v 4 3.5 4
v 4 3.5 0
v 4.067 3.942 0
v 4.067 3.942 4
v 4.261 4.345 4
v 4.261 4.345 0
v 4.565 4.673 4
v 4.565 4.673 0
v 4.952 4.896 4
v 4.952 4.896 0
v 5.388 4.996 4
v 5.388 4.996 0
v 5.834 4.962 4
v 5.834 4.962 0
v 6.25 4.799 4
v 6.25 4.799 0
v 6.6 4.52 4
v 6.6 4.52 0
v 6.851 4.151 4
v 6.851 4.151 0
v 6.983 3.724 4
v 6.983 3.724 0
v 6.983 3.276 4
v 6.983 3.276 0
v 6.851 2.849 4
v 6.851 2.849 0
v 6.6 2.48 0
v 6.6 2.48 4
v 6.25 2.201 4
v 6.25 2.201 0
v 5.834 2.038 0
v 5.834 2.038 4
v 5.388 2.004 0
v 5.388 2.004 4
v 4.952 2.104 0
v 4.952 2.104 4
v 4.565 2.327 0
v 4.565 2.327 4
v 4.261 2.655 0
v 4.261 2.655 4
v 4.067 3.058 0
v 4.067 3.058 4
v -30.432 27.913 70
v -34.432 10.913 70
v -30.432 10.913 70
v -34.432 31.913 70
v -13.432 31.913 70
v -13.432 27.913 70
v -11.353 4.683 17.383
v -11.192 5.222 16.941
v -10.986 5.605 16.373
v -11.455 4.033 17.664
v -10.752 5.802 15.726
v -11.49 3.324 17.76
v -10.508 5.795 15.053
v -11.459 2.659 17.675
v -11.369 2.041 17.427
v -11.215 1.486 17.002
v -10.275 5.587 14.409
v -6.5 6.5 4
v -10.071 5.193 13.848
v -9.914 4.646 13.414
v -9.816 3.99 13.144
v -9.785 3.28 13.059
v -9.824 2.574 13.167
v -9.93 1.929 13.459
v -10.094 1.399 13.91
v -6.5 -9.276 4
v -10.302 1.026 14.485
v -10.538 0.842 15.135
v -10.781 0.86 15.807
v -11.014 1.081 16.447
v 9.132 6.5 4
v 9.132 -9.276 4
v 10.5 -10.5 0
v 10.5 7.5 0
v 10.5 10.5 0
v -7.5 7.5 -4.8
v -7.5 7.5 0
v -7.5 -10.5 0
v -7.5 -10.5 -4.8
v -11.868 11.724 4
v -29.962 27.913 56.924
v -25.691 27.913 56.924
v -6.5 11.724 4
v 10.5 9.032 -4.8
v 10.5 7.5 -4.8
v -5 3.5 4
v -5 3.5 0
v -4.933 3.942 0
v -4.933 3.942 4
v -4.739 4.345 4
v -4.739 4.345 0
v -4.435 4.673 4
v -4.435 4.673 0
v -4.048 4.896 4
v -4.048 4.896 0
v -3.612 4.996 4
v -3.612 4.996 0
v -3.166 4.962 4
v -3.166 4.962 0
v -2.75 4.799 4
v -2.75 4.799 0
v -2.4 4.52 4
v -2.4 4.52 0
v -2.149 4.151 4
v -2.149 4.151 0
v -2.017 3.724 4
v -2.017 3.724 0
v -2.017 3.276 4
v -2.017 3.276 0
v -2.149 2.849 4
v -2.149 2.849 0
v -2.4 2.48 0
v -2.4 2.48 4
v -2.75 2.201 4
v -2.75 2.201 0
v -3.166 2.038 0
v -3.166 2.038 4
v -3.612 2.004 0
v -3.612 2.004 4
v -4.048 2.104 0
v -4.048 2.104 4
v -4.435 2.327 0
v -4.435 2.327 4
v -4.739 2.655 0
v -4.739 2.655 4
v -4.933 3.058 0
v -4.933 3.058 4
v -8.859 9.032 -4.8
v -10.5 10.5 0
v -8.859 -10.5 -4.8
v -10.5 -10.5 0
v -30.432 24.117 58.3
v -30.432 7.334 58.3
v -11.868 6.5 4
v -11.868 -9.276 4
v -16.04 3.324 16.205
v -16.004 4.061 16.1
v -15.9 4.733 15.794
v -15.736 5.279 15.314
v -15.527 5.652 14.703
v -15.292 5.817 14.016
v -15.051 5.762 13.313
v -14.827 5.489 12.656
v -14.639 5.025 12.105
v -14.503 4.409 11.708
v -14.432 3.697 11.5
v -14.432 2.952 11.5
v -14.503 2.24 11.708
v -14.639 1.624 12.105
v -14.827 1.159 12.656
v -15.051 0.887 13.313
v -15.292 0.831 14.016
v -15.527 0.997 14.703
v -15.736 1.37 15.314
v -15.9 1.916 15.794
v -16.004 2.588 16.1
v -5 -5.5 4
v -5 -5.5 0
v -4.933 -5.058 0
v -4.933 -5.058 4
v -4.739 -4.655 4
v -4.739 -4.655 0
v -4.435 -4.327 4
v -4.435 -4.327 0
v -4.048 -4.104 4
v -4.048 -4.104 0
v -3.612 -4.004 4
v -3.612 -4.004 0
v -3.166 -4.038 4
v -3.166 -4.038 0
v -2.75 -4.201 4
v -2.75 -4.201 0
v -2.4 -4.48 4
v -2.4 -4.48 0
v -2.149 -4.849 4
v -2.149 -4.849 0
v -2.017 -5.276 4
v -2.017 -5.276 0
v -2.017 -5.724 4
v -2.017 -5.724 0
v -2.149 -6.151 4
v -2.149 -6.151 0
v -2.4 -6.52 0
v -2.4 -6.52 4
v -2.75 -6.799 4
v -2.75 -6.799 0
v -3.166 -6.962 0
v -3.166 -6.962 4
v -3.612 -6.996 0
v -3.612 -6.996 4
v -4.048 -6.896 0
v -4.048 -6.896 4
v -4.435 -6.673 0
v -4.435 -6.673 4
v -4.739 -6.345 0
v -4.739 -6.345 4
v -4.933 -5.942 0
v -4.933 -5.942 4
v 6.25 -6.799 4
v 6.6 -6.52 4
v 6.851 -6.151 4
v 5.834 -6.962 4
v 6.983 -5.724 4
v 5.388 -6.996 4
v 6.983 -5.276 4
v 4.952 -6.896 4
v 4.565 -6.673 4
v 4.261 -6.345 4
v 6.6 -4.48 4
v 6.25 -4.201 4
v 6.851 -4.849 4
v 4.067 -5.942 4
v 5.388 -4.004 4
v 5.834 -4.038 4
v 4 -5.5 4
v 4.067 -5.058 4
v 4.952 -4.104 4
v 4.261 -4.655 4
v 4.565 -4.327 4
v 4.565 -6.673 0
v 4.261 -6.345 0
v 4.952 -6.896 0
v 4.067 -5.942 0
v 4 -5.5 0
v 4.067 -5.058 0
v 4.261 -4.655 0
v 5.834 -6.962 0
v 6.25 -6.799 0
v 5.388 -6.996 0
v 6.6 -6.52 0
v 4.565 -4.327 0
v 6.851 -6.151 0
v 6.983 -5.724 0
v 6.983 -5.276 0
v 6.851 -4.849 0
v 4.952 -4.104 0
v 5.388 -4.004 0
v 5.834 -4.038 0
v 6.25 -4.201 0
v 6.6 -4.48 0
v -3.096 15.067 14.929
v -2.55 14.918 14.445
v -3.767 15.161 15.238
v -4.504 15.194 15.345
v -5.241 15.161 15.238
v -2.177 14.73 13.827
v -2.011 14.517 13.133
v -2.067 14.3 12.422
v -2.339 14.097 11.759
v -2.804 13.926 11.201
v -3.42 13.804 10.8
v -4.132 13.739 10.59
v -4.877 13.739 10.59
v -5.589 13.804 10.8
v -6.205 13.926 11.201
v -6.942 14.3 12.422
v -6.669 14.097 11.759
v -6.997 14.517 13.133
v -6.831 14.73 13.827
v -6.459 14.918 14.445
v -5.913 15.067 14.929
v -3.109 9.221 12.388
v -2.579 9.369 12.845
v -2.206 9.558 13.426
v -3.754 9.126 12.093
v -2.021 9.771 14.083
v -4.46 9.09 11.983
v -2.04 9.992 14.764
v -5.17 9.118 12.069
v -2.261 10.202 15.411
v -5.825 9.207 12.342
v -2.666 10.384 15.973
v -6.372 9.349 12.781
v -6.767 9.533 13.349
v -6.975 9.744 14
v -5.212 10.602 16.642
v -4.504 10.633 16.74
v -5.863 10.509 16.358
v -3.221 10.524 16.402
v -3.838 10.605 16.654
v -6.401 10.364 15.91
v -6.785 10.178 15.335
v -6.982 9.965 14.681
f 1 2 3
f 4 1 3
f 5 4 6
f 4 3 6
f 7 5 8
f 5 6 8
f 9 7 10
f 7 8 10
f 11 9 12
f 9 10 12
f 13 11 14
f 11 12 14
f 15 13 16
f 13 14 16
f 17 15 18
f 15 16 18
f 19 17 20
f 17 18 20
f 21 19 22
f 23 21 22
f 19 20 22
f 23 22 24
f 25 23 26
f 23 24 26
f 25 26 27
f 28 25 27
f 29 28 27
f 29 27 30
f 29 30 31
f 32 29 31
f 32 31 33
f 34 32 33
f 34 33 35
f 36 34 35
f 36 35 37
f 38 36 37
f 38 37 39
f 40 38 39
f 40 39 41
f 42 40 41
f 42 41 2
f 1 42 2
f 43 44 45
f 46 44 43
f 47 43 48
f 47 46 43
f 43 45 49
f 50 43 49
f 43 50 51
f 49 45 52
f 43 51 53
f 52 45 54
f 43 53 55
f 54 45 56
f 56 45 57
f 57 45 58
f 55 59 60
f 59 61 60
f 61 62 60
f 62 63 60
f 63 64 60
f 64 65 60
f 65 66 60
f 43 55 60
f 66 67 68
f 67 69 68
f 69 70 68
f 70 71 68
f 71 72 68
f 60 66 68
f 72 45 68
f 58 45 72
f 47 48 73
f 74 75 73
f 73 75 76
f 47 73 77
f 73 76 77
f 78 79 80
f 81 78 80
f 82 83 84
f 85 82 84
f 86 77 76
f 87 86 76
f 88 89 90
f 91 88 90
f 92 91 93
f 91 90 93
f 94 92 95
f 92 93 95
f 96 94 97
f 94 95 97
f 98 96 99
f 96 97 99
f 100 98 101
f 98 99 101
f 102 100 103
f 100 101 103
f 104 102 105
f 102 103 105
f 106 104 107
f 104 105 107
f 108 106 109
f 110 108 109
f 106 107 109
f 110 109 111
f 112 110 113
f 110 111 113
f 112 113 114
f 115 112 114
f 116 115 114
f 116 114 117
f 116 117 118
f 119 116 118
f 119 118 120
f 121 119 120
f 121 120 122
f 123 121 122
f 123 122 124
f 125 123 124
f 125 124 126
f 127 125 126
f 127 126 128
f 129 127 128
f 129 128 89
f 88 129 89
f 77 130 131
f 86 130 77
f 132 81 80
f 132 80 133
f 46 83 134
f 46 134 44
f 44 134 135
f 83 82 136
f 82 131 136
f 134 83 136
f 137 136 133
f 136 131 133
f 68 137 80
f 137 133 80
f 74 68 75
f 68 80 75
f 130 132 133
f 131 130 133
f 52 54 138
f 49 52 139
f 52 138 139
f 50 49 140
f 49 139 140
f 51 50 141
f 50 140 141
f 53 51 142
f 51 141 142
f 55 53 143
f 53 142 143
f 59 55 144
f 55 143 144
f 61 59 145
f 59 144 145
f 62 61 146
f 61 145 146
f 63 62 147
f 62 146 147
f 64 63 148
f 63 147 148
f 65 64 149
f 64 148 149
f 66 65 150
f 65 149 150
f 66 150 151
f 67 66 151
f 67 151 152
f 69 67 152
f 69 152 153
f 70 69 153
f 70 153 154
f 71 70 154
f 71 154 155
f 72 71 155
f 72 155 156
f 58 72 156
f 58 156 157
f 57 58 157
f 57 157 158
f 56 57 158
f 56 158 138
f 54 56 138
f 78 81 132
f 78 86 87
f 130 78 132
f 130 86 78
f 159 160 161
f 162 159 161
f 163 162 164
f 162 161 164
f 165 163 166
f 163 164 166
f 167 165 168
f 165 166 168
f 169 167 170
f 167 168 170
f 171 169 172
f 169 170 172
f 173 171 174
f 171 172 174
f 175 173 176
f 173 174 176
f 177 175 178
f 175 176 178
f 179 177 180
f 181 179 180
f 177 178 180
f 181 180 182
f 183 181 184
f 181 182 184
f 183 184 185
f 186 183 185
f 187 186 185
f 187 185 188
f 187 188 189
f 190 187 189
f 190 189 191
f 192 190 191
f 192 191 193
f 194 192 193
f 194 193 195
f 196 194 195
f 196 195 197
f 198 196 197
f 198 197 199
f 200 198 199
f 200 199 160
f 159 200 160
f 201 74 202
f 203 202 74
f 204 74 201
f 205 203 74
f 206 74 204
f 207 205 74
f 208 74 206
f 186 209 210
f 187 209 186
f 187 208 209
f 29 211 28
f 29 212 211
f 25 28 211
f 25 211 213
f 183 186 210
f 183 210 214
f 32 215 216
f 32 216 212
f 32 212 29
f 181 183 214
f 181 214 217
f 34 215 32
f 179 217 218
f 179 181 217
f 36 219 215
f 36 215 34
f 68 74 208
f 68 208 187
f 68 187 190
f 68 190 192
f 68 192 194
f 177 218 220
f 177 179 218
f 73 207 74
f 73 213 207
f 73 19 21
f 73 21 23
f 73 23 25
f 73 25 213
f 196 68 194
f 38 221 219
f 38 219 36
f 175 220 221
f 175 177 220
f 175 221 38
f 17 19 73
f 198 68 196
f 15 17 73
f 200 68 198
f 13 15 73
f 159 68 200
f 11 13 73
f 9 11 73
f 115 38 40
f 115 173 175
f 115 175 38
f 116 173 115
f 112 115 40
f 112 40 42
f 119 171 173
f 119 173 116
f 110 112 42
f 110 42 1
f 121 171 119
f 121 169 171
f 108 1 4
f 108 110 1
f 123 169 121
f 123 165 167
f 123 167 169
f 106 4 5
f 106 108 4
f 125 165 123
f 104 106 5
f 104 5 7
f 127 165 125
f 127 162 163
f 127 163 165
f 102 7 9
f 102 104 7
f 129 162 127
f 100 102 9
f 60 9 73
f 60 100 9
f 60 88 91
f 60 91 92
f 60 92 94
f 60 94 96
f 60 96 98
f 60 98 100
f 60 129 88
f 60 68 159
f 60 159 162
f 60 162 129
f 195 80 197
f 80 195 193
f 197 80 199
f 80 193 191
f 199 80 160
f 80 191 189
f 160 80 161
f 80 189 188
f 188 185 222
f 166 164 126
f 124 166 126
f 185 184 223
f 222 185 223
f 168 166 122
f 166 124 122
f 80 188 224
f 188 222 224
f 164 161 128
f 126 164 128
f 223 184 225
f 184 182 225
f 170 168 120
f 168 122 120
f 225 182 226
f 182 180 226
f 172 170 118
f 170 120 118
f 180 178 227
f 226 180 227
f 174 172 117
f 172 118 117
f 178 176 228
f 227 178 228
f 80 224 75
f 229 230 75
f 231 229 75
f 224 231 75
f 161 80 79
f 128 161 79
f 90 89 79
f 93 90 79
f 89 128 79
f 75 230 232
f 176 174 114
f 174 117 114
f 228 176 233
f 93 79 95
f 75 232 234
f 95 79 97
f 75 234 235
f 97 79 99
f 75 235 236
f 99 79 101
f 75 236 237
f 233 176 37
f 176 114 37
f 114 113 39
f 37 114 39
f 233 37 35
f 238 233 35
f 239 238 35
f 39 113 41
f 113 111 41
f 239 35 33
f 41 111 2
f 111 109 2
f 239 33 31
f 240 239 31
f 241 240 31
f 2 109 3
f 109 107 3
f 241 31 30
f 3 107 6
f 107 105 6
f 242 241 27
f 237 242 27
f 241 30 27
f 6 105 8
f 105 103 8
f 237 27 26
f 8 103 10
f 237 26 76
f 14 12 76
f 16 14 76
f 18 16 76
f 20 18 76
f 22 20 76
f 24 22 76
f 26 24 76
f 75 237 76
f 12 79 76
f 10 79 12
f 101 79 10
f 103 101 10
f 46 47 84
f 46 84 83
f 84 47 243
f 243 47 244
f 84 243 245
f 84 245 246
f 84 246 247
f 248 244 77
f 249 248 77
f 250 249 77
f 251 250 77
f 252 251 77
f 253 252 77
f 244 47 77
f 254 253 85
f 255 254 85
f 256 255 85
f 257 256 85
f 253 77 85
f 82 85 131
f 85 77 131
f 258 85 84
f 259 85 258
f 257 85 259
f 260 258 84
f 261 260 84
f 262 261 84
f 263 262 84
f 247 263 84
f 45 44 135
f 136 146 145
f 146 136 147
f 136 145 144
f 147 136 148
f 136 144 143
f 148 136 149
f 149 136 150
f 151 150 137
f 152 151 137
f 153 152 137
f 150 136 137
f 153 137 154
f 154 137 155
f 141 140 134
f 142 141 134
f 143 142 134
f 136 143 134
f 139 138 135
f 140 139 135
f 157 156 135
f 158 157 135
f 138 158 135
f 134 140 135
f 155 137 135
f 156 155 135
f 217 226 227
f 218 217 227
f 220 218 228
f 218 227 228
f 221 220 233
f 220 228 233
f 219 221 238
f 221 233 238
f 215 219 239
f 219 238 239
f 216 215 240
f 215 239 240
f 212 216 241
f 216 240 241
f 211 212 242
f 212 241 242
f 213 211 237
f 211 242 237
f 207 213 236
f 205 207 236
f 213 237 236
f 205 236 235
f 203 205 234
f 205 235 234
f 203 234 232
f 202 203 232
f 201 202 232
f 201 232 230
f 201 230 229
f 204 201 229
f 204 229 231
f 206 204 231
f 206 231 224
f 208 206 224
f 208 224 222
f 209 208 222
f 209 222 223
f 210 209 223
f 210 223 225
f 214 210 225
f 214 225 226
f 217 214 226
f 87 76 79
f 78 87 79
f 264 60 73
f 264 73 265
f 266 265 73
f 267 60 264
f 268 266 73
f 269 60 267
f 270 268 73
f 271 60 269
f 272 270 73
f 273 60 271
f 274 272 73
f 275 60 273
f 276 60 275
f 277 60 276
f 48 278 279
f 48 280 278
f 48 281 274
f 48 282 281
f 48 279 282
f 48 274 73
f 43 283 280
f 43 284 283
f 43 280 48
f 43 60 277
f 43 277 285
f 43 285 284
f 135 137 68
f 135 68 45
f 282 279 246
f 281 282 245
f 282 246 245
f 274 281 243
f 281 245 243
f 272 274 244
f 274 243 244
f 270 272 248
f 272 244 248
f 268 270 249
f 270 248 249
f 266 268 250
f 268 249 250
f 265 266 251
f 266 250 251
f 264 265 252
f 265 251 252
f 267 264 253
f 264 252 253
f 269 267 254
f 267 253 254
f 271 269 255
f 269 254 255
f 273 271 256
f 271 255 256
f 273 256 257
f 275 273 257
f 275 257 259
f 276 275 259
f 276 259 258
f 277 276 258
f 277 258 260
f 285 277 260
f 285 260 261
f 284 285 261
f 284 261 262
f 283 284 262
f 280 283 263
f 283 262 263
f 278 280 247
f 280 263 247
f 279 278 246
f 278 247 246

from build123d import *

# Parameters (mm, degrees)
SKETCH4_R             = 1.5
CUT_EXTRUDE1_DEPTH    = 85.285208987
CUT_LOFT1_START       = -30.432295628
CUT_LOFT1_DEPTH       = 40.932295728
CUT_LOFT1_START_2     = -9.276423483
CUT_LOFT1_2_DEPTH     = 37.189014281
CUT_LOFT1_START_3     = -30
CUT_LOFT1_3_OUTLINE_W = 25.432295628
CUT_LOFT1_3_OUTLINE_H = 72
CUT_LOFT1_3_DEPTH     = 19.959259101
CUT_LOFT1_START_4     = 10.040740899
CUT_LOFT1_4_OUTLINE_W = 25.432295628
CUT_LOFT1_4_OUTLINE_H = 72
CUT_LOFT1_4_DEPTH     = 16.959259101
SKETCH10_R            = 2.5
CUT_EXTRUDE2_DEPTH    = 10
SKETCH11_R            = 2.5
CUT_EXTRUDE3_DEPTH    = 10
BOSS_EXTRUDE1_DEPTH   = 4.8
SKETCH14_W            = 37.12113751
SKETCH14_H            = 26.161757616
CUT_EXTRUDE4_DEPTH    = 3
SKETCH15_W            = 15.761114721
SKETCH15_H            = 46.929857457
CUT_EXTRUDE5_DEPTH    = 3


with BuildPart() as part:
    # Loft1: read off the stored shape, not the designer's step
    # Loft1: loft between two sections, ruled curve by curve
    loft1_from = [
        Edge.make_line((-34.432295528, 31.912590798, 70), (-34.432295528, 10.912590798, 70)),
        Edge.make_line((-34.432295528, 10.912590798, 70), (-13.432295528, 10.912590798, 70)),
        Edge.make_line((-13.432295528, 10.912590798, 70), (-13.432295528, 31.912590798, 70)),
        Edge.make_line((-13.432295528, 31.912590798, 70), (-34.432295528, 31.912590798, 70)),
    ]
    loft1_to = [
        Edge.make_line((-10.5, 10.5, 0), (-10.5, -10.5, 0)),
        Edge.make_line((-10.5, -10.5, 0), (10.5, -10.5, 0)),
        Edge.make_line((10.5, -10.5, 0), (10.5, 10.5, 0)),
        Edge.make_line((10.5, 10.5, 0), (-10.5, 10.5, 0)),
    ]
    loft1 = Solid(Shell([*[Face.make_surface_from_curves(loft1_from[k], loft1_to[k]) for k in range(4)], Face(Wire(loft1_from)), Face(Wire(loft1_to))]))
    add(loft1)

    # Sketch4 → Cut-Extrude1 (cut, through all)
    with BuildSketch(Plane(origin=(0, 0, 0), x_dir=(-1, 0, 0), z_dir=(0, 0, -1))):
        with Locations((3.5, -5.5)):
            Circle(SKETCH4_R)
        with Locations((-5.5, -5.5)):
            Circle(SKETCH4_R)
        with Locations((-5.5, 3.5)):
            Circle(SKETCH4_R)
        with Locations((3.5, 3.5)):
            Circle(SKETCH4_R)
    extrude(amount=-CUT_EXTRUDE1_DEPTH, mode=Mode.SUBTRACT)

    # Cut-Loft1: read off the stored shape, not the designer's step
    # Cut-Loft1 outline → Cut-Loft1 (cut)
    with BuildSketch(Plane.YZ.offset(CUT_LOFT1_START)):
        Polygon((10.912590798, 70), (-9.276423383, 4), (6.5, 4), (27.912590798, 70), align=None)
    extrude(amount=CUT_LOFT1_DEPTH, mode=Mode.SUBTRACT)

    # Cut-Loft1 2 outline → Cut-Loft1 2 (add)
    with BuildSketch(Plane(origin=(0, 0, 0), x_dir=(1, 0, 0), z_dir=(0, 1, 0)).offset(CUT_LOFT1_START_2)):
        Polygon((-6.5, -4), (-11.867559744, -4), (-30.432295628, -58.300328622), (-30.432295628, -70), align=None)
    extrude(amount=CUT_LOFT1_2_DEPTH)

    # Cut-Loft1 3 outline → Cut-Loft1 3 (cut)
    with BuildSketch(Plane(origin=(0, 0, 0), x_dir=(1, 0, 0), z_dir=(0, 0.9562610380135655, -0.2925146614739479)).offset(CUT_LOFT1_START_3)):
        with Locations((-17.716147814, -36)):
            Rectangle(CUT_LOFT1_3_OUTLINE_W, CUT_LOFT1_3_OUTLINE_H)
    extrude(amount=CUT_LOFT1_3_DEPTH, mode=Mode.SUBTRACT)

    # Cut-Loft1 4 outline → Cut-Loft1 4 (cut)
    with BuildSketch(Plane(origin=(0, 0, 0), x_dir=(1, 0, 0), z_dir=(0, 0.9562610380135655, -0.2925146614739479)).offset(CUT_LOFT1_START_4)):
        with Locations((-17.716147814, -36)):
            Rectangle(CUT_LOFT1_4_OUTLINE_W, CUT_LOFT1_4_OUTLINE_H)
    extrude(amount=CUT_LOFT1_4_DEPTH, mode=Mode.SUBTRACT)

    # Sketch10 → Cut-Extrude2 (cut)
    with BuildSketch(Plane(origin=(0, 9.601569315, -2.937063925), x_dir=(1, 0, 0), z_dir=(0, 0.9562610380135655, -0.29251466147394767))):
        with Locations(Location((-4.504228797, -16.617876366, 0), (0, 0, 270))):
            Circle(SKETCH10_R)
    extrude(amount=-CUT_EXTRUDE2_DEPTH, mode=Mode.SUBTRACT)

    # Sketch11 → Cut-Extrude3 (cut)
    with BuildSketch(Plane(origin=(-9.401115557, 0, -3.214146797), x_dir=(-0.3235052723680801, 0, 0.9462263676045255), z_dir=(-0.9462263676045255, 0, -0.3235052723680801))):
        with Locations((18.022307071, 3.324420334)):
            Circle(SKETCH11_R)
    extrude(amount=-CUT_EXTRUDE3_DEPTH, mode=Mode.SUBTRACT)

    # Sketch13 → Boss-Extrude1 (add)
    with BuildSketch(Plane(origin=(0, 0, 0), x_dir=(-1, 0, 0), z_dir=(0, 0, -1))):
        Polygon((10.5, -10.5), (10.5, 10.5), (-10.5, 10.5), (-10.5, 7.5), (7.5, 7.5), (7.5, -10.5), align=None)
    extrude(amount=BOSS_EXTRUDE1_DEPTH)

    # Sketch14 → Cut-Extrude4 (cut)
    with BuildSketch(Plane(origin=(0, 9.601569315, -2.937063925), x_dir=(1, 0, 0), z_dir=(0, 0.9562610380135657, -0.2925146614739477))):
        with Locations((-1.808901269, 4.696953713)):
            Rectangle(SKETCH14_W, SKETCH14_H)
    extrude(amount=CUT_EXTRUDE4_DEPTH, mode=Mode.SUBTRACT)

    # Sketch15 → Cut-Extrude5 (cut)
    with BuildSketch(Plane(origin=(-9.401115557, 0, -3.214146797), x_dir=(-0.32350527236808013, 0, 0.9462263676045254), z_dir=(-0.9462263676045255, 0, -0.32350527236808013))):
        with Locations((3.08021958, -4.471111323)):
            Rectangle(SKETCH15_W, SKETCH15_H)
    extrude(amount=CUT_EXTRUDE5_DEPTH, mode=Mode.SUBTRACT)


solid = part.part
